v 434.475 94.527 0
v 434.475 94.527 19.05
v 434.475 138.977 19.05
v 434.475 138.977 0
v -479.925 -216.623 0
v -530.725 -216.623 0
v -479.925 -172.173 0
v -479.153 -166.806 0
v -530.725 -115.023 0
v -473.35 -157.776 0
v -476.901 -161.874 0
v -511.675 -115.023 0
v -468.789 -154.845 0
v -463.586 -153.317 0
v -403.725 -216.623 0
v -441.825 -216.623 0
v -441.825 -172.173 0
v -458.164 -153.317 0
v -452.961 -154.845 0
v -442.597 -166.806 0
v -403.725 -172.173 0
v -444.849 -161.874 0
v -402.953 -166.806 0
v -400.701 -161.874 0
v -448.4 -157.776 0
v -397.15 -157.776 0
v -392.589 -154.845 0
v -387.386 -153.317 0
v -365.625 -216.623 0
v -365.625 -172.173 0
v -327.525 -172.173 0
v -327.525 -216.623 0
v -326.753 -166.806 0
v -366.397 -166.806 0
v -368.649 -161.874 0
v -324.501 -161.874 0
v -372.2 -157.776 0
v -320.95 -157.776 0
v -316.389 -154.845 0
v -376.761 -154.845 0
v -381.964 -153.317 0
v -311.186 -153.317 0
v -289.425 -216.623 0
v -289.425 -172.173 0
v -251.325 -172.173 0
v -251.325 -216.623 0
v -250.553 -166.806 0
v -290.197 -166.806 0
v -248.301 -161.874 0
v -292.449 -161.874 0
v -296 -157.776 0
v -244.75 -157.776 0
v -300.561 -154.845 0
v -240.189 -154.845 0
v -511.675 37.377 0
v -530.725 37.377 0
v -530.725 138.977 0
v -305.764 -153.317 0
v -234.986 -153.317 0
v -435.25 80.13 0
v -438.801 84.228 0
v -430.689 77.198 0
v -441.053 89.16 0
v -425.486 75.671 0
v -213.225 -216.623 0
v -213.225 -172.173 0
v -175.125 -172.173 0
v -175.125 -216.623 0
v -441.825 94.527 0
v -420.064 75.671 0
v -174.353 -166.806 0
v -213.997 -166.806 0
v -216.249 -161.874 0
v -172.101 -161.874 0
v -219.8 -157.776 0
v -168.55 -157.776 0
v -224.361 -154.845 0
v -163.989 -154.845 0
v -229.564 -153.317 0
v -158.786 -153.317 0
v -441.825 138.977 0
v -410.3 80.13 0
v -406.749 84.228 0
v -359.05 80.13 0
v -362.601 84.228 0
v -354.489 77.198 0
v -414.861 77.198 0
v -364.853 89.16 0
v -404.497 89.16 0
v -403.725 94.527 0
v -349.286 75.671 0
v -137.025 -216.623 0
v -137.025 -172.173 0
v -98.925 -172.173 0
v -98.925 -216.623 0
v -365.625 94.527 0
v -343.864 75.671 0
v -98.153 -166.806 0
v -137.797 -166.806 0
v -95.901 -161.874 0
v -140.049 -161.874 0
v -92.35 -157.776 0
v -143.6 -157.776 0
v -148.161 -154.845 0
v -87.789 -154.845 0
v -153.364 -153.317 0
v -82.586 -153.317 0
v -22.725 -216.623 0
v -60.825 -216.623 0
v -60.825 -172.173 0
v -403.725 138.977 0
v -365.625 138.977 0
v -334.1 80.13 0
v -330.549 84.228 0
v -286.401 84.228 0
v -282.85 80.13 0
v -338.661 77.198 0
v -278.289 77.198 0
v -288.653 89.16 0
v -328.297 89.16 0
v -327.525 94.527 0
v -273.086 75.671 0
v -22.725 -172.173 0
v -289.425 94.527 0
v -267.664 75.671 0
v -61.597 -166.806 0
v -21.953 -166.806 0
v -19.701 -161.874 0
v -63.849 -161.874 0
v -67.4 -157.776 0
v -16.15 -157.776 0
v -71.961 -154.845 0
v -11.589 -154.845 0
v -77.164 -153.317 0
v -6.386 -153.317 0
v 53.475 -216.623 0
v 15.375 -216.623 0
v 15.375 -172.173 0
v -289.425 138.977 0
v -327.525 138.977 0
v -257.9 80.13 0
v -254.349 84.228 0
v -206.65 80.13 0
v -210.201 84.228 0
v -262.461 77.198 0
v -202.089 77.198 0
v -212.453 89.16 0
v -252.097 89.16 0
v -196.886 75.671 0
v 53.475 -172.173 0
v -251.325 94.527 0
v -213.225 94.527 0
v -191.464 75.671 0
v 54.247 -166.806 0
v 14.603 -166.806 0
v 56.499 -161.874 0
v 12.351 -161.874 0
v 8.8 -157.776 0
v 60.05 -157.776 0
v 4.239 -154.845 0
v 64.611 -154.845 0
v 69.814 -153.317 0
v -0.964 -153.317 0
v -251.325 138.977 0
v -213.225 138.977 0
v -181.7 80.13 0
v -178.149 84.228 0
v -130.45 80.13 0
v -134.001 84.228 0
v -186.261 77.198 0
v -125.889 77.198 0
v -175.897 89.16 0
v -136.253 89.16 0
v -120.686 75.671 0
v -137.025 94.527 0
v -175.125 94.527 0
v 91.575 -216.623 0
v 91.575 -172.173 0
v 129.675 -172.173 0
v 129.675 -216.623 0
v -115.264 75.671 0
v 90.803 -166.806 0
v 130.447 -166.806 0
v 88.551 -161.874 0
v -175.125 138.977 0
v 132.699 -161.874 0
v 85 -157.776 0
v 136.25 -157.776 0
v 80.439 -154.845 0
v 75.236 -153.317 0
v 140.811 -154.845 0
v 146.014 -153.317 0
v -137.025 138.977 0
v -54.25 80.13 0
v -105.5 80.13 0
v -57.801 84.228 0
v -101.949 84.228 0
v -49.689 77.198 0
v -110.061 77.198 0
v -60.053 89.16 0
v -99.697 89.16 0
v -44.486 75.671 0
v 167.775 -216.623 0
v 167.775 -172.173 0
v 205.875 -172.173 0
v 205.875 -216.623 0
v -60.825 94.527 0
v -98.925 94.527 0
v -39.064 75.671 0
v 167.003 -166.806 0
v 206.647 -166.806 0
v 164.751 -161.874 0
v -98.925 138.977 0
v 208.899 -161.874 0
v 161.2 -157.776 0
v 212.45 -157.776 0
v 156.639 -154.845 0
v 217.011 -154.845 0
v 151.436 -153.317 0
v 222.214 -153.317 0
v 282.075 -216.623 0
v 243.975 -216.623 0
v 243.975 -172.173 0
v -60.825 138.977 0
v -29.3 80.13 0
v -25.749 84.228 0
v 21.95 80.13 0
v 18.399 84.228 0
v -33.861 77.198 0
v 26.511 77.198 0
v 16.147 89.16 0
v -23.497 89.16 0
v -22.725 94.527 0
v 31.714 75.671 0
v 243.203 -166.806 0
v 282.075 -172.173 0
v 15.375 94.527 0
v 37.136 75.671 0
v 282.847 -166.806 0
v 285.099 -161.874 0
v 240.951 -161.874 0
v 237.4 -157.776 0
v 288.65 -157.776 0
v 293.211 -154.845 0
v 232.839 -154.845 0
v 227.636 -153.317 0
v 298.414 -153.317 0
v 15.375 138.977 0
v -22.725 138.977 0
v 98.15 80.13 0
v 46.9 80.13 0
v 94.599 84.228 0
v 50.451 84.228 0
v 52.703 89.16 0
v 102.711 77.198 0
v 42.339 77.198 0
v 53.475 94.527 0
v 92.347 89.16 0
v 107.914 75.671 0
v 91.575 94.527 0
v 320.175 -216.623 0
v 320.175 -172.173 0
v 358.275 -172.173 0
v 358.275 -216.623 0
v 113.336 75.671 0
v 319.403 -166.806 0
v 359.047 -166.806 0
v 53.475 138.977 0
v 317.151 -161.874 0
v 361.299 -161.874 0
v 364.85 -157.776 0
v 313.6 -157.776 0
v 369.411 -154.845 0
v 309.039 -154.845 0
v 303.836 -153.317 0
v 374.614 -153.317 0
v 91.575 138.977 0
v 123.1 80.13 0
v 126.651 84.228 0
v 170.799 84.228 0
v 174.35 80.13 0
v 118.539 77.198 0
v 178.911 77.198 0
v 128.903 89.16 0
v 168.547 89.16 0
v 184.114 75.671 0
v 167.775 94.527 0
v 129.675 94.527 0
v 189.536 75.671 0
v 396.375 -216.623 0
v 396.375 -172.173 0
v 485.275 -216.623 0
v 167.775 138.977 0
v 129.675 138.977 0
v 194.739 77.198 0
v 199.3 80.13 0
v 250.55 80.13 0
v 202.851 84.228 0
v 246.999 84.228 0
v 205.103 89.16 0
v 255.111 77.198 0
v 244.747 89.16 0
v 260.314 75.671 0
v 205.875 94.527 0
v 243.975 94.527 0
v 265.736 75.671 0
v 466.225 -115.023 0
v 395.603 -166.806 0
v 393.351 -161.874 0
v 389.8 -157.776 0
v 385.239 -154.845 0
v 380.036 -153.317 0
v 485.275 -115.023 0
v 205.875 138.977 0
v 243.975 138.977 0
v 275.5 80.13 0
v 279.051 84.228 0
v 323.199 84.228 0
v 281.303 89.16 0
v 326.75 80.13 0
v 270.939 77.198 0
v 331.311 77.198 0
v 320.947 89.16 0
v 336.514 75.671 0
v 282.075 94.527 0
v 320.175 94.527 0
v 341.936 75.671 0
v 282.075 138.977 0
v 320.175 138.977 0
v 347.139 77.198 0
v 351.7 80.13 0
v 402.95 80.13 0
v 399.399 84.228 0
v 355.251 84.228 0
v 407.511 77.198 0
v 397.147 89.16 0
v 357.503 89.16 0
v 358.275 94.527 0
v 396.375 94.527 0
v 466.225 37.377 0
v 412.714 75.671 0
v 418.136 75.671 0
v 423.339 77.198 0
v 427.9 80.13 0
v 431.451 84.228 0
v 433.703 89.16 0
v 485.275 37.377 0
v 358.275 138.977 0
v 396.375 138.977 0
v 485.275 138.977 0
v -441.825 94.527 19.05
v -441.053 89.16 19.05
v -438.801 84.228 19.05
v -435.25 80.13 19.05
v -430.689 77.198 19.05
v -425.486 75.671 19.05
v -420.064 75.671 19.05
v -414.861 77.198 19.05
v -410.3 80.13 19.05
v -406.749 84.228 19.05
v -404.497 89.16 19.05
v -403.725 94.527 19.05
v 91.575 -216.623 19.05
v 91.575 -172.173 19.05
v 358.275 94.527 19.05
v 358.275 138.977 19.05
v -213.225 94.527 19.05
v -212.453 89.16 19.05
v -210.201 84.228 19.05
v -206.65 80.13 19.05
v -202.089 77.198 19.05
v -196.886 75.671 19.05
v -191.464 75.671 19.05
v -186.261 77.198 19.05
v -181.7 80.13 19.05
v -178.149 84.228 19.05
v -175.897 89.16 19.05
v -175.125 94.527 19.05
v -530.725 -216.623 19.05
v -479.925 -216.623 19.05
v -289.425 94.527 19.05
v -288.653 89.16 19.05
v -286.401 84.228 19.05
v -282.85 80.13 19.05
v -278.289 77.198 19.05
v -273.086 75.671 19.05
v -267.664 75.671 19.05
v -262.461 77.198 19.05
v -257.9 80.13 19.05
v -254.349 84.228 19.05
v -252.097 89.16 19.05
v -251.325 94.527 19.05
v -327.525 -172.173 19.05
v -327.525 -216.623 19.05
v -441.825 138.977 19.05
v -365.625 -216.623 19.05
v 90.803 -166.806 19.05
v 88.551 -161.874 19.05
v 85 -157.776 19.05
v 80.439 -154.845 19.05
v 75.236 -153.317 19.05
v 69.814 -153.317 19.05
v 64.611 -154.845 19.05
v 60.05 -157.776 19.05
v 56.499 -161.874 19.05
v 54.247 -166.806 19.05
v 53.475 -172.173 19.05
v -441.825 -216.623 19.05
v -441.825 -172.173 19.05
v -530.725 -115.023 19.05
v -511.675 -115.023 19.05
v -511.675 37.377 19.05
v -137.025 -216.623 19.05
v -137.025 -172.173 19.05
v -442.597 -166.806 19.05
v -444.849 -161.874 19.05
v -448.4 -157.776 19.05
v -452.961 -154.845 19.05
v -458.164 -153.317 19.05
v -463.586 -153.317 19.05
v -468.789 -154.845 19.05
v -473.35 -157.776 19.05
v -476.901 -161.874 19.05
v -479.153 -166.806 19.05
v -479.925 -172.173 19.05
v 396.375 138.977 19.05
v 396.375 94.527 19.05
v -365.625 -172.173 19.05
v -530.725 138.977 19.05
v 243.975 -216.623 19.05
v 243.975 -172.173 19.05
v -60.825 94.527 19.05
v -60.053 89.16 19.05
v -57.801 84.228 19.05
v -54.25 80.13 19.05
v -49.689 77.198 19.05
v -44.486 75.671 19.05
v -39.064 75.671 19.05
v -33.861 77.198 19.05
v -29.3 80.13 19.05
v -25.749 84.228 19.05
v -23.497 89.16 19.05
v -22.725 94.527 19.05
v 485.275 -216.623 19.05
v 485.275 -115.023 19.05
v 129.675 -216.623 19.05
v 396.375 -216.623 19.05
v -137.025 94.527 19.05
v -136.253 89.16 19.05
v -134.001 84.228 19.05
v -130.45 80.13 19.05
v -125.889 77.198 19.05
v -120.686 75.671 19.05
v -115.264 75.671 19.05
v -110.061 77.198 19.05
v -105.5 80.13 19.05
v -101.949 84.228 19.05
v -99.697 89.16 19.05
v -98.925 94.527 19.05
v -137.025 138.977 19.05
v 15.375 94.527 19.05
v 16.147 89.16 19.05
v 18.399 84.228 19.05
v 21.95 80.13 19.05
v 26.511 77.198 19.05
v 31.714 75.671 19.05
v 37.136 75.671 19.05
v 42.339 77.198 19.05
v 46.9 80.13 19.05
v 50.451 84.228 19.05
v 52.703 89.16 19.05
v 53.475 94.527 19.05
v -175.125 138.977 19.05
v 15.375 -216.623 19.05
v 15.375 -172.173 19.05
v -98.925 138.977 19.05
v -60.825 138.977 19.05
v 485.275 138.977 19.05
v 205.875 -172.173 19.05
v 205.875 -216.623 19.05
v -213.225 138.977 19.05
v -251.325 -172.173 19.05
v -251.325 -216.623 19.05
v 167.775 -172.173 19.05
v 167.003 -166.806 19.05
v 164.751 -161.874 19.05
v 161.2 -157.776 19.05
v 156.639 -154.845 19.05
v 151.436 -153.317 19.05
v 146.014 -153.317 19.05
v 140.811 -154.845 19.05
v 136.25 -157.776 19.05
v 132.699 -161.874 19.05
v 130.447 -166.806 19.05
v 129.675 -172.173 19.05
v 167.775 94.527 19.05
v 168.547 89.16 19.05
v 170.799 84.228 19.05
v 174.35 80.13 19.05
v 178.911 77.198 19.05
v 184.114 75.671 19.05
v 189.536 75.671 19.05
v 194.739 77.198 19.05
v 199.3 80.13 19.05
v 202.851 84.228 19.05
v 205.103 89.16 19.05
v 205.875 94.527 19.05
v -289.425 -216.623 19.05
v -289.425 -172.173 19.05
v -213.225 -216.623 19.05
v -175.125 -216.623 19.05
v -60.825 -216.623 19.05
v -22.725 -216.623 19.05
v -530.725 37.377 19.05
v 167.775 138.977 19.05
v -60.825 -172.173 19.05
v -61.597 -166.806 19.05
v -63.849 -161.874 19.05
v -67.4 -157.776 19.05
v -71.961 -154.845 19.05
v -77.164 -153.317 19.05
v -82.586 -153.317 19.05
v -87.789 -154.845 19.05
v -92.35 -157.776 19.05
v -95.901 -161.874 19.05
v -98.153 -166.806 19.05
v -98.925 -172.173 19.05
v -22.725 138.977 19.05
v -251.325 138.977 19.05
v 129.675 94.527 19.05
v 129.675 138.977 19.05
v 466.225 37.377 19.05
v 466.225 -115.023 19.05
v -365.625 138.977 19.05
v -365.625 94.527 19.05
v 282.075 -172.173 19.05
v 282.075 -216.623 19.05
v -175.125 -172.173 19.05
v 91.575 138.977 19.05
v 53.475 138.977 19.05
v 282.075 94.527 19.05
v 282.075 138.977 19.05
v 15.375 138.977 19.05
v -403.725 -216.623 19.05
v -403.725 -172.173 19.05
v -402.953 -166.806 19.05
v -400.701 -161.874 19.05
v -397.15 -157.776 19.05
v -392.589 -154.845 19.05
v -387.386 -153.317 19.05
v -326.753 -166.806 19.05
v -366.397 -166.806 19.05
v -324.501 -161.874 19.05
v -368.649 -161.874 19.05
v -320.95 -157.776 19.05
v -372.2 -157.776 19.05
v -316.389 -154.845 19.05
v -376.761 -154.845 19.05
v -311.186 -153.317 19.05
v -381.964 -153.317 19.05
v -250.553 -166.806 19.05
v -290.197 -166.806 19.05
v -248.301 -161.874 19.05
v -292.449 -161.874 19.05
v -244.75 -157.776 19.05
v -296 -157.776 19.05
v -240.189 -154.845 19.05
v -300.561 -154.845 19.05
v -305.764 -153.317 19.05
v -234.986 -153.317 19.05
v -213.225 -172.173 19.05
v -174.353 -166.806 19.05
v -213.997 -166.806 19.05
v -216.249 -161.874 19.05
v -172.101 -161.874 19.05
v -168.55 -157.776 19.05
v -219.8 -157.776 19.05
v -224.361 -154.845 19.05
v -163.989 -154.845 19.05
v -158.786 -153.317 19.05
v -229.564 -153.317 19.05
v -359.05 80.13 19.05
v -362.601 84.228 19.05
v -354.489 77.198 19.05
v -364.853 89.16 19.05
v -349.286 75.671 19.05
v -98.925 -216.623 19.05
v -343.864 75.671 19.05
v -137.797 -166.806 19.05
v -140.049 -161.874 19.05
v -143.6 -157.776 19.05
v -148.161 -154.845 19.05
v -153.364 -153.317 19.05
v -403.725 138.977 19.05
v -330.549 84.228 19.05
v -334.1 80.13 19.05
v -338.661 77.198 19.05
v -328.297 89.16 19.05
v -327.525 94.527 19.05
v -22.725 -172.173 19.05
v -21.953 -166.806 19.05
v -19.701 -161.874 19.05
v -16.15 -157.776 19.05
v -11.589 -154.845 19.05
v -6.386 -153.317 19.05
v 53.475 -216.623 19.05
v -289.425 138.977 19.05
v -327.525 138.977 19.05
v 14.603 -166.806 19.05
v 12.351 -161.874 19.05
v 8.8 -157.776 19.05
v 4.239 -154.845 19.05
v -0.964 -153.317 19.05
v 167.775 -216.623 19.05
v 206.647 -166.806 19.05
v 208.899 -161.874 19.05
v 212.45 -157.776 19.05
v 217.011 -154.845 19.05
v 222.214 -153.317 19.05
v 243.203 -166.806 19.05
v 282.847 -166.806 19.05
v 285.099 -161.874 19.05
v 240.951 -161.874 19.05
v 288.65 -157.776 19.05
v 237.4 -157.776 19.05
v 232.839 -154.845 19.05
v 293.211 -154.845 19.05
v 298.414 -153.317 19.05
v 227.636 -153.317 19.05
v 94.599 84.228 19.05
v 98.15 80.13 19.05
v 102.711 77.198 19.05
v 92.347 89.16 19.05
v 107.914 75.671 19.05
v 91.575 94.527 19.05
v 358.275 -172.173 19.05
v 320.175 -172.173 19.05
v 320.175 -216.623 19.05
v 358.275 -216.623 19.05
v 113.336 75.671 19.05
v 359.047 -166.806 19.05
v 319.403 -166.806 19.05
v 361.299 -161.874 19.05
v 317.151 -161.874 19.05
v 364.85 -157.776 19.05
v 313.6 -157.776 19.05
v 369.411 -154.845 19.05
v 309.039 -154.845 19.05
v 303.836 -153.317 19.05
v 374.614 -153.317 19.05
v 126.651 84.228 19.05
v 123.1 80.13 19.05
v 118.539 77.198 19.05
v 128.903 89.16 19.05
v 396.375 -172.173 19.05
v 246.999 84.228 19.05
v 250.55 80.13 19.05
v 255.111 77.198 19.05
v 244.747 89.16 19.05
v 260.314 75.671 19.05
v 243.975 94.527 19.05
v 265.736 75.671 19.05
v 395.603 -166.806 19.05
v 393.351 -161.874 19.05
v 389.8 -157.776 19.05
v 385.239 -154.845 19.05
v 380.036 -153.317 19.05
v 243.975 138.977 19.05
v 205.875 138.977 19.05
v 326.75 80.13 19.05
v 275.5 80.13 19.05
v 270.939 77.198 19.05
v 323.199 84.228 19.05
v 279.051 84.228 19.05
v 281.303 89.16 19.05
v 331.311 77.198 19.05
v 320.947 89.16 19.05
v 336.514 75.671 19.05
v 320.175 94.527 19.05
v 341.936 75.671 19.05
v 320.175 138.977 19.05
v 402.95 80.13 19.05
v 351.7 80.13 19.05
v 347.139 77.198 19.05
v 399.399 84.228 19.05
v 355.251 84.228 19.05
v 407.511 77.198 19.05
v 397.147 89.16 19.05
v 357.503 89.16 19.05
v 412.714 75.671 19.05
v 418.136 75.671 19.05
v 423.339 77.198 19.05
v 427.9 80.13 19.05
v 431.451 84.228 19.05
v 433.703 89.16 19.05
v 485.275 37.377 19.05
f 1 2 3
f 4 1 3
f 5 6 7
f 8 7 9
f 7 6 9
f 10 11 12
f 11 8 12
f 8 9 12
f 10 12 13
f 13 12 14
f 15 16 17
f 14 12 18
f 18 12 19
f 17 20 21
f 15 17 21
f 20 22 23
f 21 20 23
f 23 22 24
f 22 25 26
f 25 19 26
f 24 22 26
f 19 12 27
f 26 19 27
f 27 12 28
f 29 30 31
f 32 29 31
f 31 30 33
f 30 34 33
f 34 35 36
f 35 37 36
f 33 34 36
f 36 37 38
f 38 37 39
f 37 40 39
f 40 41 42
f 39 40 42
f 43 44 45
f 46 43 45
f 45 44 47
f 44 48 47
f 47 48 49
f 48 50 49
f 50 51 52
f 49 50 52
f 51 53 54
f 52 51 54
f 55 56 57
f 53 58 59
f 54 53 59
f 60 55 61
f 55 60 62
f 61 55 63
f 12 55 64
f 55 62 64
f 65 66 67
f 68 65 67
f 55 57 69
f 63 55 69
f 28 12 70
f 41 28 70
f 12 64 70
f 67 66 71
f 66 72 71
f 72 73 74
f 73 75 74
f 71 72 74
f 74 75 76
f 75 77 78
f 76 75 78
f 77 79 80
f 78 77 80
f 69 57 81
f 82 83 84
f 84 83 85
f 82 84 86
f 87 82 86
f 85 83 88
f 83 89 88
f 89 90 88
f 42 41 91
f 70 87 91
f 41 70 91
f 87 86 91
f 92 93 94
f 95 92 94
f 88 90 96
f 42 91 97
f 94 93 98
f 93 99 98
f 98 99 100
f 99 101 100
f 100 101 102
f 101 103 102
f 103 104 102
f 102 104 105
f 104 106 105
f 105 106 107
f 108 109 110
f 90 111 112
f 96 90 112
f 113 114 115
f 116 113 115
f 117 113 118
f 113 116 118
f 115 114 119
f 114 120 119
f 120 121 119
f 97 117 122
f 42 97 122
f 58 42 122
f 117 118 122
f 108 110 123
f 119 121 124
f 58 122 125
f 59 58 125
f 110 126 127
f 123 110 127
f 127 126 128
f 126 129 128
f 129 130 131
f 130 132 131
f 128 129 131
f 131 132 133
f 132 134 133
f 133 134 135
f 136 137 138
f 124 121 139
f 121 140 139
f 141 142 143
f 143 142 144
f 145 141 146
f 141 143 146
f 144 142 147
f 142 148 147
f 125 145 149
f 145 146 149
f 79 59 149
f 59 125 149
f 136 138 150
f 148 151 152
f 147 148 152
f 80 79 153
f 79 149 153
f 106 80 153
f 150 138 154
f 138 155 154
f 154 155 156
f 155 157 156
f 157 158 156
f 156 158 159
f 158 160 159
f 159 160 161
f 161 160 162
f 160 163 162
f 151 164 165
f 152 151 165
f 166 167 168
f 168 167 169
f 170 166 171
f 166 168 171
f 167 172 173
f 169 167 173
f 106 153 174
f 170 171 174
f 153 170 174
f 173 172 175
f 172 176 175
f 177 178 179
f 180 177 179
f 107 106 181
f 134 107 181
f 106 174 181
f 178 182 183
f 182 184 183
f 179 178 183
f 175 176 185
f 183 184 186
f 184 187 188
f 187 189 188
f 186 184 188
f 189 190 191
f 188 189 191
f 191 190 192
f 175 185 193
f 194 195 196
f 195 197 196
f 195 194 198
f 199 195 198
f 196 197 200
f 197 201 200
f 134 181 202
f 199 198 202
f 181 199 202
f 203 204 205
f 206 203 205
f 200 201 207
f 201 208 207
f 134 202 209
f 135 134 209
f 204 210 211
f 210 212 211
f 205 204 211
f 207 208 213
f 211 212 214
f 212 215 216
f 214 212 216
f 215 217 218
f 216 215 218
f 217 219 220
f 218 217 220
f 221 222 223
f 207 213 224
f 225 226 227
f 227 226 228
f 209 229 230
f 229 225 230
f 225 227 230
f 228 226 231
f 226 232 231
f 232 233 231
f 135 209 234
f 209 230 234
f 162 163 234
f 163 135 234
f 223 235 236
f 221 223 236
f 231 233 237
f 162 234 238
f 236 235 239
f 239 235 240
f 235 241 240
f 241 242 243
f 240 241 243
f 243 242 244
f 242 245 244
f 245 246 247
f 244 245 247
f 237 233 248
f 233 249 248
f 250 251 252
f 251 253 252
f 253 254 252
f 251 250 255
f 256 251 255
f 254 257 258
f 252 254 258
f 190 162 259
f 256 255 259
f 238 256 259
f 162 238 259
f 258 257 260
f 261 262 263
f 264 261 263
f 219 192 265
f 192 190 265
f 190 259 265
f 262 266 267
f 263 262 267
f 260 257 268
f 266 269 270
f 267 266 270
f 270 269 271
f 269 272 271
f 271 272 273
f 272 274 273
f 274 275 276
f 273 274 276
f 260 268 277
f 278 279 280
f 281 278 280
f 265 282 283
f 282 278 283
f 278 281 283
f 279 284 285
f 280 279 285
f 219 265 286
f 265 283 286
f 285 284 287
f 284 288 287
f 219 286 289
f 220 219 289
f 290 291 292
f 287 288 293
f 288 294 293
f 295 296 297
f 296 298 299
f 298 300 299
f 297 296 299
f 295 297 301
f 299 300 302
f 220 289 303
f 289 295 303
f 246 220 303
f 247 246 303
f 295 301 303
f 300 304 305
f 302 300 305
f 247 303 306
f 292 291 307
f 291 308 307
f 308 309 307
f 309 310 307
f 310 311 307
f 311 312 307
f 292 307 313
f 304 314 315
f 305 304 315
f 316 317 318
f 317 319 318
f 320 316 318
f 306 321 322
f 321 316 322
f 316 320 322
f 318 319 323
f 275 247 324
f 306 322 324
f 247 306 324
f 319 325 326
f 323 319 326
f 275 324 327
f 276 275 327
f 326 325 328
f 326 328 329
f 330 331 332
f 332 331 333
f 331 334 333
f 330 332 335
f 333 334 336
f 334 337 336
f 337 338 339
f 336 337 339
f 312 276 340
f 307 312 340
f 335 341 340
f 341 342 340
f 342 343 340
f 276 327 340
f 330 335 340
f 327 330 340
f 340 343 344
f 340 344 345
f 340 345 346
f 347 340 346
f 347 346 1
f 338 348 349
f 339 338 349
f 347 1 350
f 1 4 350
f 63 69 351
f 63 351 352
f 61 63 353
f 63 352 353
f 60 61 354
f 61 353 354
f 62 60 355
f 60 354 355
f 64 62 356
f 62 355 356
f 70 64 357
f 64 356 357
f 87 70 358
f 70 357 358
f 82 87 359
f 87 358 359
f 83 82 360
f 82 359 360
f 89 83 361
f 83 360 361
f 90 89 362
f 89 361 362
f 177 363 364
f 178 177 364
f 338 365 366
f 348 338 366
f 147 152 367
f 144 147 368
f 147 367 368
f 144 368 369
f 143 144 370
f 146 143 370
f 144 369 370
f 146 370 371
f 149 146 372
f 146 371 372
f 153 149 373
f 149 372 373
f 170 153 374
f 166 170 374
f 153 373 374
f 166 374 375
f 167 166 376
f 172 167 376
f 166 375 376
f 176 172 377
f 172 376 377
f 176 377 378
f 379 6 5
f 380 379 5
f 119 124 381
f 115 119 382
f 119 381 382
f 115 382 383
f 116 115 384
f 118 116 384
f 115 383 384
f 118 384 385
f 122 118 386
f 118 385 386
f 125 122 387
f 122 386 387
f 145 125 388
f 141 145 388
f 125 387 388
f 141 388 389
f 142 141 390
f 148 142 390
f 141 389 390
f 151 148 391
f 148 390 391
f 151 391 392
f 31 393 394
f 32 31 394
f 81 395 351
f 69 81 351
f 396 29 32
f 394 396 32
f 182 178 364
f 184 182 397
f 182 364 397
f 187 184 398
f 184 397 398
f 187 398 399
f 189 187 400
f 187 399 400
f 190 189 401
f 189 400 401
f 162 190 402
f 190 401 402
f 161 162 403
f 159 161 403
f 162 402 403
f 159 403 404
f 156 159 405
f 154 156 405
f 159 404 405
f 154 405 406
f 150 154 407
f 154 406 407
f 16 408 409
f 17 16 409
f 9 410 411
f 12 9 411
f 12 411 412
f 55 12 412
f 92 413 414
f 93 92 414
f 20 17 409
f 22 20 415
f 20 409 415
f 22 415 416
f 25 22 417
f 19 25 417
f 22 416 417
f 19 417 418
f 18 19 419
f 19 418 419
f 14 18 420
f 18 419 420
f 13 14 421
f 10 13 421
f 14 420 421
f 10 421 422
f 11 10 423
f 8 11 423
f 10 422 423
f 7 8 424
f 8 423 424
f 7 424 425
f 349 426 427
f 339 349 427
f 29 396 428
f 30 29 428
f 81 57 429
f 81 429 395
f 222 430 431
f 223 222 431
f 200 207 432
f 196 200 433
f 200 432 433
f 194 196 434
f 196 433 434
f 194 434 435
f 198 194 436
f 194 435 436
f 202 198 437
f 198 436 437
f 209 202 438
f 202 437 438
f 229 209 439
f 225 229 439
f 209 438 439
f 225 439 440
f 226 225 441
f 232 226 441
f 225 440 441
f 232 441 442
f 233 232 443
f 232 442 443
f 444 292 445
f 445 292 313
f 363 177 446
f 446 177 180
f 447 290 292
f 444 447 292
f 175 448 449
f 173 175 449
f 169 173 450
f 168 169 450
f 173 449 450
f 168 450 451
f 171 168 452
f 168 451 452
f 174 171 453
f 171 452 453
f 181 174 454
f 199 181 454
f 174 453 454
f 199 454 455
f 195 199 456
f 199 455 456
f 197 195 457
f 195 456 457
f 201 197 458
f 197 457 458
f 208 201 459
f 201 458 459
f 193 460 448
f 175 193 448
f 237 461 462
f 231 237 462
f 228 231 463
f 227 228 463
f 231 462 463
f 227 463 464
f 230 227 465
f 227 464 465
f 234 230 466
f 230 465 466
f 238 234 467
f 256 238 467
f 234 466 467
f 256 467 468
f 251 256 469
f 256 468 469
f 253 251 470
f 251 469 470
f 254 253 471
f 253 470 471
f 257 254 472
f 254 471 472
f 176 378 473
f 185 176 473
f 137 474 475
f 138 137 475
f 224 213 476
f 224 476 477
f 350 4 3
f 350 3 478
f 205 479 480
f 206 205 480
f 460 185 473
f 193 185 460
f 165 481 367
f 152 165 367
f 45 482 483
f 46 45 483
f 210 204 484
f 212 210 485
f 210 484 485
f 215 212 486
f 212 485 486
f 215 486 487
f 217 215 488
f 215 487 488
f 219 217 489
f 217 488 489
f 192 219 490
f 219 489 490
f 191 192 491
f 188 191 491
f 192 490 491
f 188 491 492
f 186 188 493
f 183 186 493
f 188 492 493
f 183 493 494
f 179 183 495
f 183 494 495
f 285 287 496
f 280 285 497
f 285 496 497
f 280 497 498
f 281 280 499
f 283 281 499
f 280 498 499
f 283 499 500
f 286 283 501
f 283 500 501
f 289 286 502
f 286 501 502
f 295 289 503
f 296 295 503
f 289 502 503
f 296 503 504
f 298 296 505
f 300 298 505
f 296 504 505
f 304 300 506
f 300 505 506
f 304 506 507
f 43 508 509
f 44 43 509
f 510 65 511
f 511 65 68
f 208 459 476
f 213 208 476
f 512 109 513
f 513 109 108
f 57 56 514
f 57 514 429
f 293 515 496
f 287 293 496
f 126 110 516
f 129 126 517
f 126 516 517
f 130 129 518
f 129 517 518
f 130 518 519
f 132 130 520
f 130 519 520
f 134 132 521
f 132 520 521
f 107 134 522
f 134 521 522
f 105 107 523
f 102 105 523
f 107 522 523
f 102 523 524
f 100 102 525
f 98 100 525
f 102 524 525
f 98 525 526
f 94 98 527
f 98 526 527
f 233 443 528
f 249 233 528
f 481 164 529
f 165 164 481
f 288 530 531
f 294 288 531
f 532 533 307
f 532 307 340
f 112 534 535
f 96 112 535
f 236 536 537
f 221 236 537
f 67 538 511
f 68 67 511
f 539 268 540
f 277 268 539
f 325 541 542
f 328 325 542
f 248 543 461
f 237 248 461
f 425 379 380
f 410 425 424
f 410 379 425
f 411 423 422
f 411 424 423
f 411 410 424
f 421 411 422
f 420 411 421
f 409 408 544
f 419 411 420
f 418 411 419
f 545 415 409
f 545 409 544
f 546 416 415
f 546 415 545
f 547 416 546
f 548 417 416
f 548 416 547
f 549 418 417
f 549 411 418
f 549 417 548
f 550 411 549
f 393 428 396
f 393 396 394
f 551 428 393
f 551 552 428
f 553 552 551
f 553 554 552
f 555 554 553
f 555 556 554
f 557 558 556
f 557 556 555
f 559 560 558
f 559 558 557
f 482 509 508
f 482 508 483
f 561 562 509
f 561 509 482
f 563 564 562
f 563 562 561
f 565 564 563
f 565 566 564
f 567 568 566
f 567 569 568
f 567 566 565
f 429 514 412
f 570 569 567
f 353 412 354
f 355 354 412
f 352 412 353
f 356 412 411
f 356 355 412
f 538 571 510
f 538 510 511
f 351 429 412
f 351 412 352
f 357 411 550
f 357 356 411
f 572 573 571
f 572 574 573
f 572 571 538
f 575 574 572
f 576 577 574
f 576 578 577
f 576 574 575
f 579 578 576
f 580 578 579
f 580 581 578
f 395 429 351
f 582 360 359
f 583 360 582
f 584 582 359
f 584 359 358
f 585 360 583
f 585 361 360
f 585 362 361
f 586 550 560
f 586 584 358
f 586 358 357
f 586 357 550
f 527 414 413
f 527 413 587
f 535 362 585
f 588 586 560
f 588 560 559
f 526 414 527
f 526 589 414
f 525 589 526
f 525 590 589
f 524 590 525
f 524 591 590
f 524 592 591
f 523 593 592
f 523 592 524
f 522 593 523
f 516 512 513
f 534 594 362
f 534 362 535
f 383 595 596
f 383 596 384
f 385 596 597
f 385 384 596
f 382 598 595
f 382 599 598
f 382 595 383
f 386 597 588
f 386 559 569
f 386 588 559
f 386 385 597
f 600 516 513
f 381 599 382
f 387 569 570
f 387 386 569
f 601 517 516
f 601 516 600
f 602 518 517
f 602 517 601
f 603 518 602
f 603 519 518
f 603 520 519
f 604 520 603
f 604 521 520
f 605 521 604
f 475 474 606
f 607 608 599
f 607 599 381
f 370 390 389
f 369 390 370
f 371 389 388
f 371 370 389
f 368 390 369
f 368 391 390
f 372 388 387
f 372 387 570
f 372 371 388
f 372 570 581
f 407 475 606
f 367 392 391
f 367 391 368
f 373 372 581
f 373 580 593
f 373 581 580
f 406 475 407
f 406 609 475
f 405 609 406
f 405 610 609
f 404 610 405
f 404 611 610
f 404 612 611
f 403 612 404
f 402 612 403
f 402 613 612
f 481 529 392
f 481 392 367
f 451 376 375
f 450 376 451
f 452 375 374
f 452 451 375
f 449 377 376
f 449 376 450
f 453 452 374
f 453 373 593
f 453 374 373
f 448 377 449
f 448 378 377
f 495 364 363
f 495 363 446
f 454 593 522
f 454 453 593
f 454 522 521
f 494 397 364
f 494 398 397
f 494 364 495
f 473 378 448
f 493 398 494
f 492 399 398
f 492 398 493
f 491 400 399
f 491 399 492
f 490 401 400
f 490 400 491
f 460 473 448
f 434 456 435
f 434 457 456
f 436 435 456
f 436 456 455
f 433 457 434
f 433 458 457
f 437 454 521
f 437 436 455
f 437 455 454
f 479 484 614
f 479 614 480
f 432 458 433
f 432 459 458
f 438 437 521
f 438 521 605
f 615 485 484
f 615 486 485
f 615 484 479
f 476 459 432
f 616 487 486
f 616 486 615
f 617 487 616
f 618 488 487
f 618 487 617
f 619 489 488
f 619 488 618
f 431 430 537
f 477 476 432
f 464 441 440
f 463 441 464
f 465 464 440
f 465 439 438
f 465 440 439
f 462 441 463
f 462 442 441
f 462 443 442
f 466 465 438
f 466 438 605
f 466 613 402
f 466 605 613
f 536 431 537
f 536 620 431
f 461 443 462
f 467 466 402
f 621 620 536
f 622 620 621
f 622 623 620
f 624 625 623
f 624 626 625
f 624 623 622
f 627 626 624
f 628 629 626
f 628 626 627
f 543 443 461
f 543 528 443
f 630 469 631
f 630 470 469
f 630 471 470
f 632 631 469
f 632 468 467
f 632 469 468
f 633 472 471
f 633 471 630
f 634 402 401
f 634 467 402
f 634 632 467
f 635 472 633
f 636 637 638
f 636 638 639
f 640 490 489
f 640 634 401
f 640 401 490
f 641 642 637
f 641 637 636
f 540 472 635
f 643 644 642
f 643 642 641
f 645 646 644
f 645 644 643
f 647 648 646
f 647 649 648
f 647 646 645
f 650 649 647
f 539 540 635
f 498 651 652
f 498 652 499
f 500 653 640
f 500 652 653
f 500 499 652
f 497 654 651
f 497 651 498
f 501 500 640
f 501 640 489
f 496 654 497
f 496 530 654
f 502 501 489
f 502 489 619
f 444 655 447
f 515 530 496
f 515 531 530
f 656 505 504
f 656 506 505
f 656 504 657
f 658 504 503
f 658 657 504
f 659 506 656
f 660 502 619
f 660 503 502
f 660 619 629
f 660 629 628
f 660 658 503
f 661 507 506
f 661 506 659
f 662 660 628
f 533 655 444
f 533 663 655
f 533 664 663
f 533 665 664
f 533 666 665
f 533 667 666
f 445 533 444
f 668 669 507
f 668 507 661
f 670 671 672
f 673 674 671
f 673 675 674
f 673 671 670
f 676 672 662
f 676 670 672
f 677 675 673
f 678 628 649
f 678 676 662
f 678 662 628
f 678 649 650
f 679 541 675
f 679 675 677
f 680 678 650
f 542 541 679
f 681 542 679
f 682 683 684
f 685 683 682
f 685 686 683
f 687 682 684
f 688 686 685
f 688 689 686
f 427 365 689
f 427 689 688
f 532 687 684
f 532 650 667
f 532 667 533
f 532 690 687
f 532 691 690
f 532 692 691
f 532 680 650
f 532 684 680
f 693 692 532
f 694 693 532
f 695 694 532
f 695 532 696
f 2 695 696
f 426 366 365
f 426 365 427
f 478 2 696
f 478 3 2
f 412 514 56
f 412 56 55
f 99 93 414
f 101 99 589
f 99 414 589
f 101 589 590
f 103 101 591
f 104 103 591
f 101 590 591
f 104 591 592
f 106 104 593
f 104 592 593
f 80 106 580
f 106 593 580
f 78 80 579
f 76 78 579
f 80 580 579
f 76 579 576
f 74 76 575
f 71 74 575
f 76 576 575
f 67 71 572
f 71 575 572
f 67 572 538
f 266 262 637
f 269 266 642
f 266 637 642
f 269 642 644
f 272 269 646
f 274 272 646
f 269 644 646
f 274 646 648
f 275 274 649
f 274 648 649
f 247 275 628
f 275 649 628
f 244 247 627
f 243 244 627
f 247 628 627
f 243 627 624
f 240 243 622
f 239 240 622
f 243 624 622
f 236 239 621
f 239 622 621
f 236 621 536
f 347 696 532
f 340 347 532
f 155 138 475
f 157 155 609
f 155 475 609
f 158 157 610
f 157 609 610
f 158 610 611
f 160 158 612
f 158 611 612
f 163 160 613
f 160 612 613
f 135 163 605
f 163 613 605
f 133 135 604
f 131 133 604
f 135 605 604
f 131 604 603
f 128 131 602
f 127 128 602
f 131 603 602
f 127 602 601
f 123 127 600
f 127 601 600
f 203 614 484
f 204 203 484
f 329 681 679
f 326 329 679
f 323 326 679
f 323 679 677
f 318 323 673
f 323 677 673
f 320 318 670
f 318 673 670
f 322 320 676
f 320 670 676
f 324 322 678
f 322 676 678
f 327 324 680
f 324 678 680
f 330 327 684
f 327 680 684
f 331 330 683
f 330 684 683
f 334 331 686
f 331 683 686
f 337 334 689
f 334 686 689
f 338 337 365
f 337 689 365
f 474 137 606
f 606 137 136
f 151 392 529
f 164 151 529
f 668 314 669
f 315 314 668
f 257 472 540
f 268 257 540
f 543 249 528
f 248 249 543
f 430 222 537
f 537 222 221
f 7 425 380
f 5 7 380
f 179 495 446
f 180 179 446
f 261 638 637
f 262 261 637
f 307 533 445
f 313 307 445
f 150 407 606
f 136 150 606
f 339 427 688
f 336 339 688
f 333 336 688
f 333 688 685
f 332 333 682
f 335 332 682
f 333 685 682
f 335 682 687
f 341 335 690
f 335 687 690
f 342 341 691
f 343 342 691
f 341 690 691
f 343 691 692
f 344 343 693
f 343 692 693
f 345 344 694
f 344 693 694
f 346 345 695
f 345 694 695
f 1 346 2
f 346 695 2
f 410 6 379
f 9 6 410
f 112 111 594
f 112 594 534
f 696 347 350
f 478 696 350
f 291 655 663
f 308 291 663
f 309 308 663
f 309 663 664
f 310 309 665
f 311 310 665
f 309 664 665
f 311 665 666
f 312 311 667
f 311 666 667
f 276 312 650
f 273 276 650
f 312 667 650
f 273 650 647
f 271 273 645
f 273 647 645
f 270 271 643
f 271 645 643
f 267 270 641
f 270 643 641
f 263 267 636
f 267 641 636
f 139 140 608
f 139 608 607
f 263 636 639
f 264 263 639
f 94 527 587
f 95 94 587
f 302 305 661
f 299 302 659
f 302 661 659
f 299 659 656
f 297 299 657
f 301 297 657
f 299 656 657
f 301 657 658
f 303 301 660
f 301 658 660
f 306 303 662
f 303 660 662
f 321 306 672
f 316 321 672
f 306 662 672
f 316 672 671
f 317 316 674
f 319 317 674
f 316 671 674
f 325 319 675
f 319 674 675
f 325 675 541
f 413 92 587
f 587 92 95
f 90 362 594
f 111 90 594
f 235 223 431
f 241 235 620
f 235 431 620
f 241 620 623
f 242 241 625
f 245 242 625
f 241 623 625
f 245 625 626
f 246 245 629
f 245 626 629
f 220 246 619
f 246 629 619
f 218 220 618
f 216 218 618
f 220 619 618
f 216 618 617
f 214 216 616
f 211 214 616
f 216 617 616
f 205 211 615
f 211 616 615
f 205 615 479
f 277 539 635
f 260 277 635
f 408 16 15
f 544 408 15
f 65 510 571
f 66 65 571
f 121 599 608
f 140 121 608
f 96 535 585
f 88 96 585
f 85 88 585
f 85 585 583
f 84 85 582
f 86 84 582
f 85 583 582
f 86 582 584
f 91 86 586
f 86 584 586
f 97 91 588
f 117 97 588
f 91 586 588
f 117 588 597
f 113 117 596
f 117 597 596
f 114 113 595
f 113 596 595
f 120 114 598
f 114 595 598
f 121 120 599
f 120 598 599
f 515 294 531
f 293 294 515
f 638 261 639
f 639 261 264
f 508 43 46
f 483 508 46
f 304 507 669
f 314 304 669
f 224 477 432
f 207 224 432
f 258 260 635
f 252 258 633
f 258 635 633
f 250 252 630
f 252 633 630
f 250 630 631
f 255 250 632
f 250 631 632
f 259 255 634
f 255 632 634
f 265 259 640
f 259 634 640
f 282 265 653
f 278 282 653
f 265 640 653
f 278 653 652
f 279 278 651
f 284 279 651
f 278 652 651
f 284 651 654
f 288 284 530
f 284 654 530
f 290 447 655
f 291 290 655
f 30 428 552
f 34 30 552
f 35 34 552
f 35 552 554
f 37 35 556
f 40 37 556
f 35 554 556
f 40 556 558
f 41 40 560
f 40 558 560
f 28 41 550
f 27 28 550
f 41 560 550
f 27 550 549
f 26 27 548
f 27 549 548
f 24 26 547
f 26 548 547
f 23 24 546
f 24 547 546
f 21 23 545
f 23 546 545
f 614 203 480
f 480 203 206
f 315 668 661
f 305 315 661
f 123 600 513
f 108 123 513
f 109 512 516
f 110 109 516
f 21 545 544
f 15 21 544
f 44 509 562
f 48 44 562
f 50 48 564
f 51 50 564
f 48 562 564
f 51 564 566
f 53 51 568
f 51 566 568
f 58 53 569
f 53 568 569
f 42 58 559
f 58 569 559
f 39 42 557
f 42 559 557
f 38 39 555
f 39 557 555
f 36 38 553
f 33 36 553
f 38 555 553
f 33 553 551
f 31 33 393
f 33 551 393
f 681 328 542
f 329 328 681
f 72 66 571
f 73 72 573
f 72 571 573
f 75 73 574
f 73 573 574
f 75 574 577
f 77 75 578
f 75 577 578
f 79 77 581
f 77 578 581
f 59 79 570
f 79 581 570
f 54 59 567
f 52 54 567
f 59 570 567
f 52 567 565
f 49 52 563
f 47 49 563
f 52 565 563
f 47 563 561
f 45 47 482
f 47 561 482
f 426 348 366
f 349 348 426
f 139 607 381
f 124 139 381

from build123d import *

# Parameters (mm, degrees)
F0_W     = 1016
F0_H     = 355.6
F1_DEPTH = 19.05
F3_DEPTH = 19.051
F5_DEPTH = 19.051
F6_W     = 6.35
F6_H     = 152.4
F7_DEPTH = 19.051


with BuildPart() as f1:
    # F0 (on Top) → F1 (new body)
    with BuildSketch(Plane.XY):
        with Locations((-22.724911, -38.823086)):
            Rectangle(F0_W, F0_H)
    extrude(amount=F1_DEPTH)

    # F2 (on face) → F3 (cut, through all)
    with BuildSketch(Plane.XY.offset(19.05)):
        with BuildLine():
            Line((-403.724911, 138.976914), (-441.824911, 138.976914))
            Line((-441.824911, 138.976914), (-441.824911, 94.526914))
            ThreePointArc((-441.824911, 94.526914), (-422.774911, 75.476914), (-403.724911, 94.526914))
            Line((-403.724911, 94.526914), (-403.724911, 138.976914))
        make_face()
        with BuildLine():
            Line((-441.824911, -216.623086), (-441.824911, -172.173086))
            ThreePointArc((-441.824911, -172.173086), (-460.874911, -153.123086), (-479.924911, -172.173086))
            Line((-479.924911, -172.173086), (-479.924911, -216.623086))
            Line((-479.924911, -216.623086), (-441.824911, -216.623086))
        make_face()
        with BuildLine():
            Line((-327.524911, 138.976914), (-365.624911, 138.976914))
            Line((-365.624911, 138.976914), (-365.624911, 94.526914))
            ThreePointArc((-365.624911, 94.526914), (-346.574911, 75.476914), (-327.524911, 94.526914))
            Line((-327.524911, 94.526914), (-327.524911, 138.976914))
        make_face()
        with BuildLine():
            Line((-365.624911, -216.623086), (-365.624911, -172.173086))
            ThreePointArc((-365.624911, -172.173086), (-384.674911, -153.123086), (-403.724911, -172.173086))
            Line((-403.724911, -172.173086), (-403.724911, -216.623086))
            Line((-403.724911, -216.623086), (-365.624911, -216.623086))
        make_face()
        with BuildLine():
            Line((-251.324911, 138.976914), (-289.424911, 138.976914))
            Line((-289.424911, 138.976914), (-289.424911, 94.526914))
            ThreePointArc((-289.424911, 94.526914), (-270.374911, 75.476914), (-251.324911, 94.526914))
            Line((-251.324911, 94.526914), (-251.324911, 138.976914))
        make_face()
        with BuildLine():
            Line((-289.424911, -216.623086), (-289.424911, -172.173086))
            ThreePointArc((-289.424911, -172.173086), (-308.474911, -153.123086), (-327.524911, -172.173086))
            Line((-327.524911, -172.173086), (-327.524911, -216.623086))
            Line((-327.524911, -216.623086), (-289.424911, -216.623086))
        make_face()
        with BuildLine():
            Line((-175.124911, 138.976914), (-213.224911, 138.976914))
            Line((-213.224911, 138.976914), (-213.224911, 94.526914))
            ThreePointArc((-213.224911, 94.526914), (-194.174911, 75.476914), (-175.124911, 94.526914))
            Line((-175.124911, 94.526914), (-175.124911, 138.976914))
        make_face()
        with BuildLine():
            Line((-213.224911, -216.623086), (-213.224911, -172.173086))
            ThreePointArc((-213.224911, -172.173086), (-232.274911, -153.123086), (-251.324911, -172.173086))
            Line((-251.324911, -172.173086), (-251.324911, -216.623086))
            Line((-251.324911, -216.623086), (-213.224911, -216.623086))
        make_face()
        with BuildLine():
            Line((-98.924911, 138.976914), (-137.024911, 138.976914))
            Line((-137.024911, 138.976914), (-137.024911, 94.526914))
            ThreePointArc((-137.024911, 94.526914), (-117.974911, 75.476914), (-98.924911, 94.526914))
            Line((-98.924911, 94.526914), (-98.924911, 138.976914))
        make_face()
        with BuildLine():
            Line((-137.024911, -216.623086), (-137.024911, -172.173086))
            ThreePointArc((-137.024911, -172.173086), (-156.074911, -153.123086), (-175.124911, -172.173086))
            Line((-175.124911, -172.173086), (-175.124911, -216.623086))
            Line((-175.124911, -216.623086), (-137.024911, -216.623086))
        make_face()
        with BuildLine():
            Line((-22.724911, 138.976914), (-60.824911, 138.976914))
            Line((-60.824911, 138.976914), (-60.824911, 94.526914))
            ThreePointArc((-60.824911, 94.526914), (-41.774911, 75.476914), (-22.724911, 94.526914))
            Line((-22.724911, 94.526914), (-22.724911, 138.976914))
        make_face()
        with BuildLine():
            Line((-60.824911, -216.623086), (-60.824911, -172.173086))
            ThreePointArc((-60.824911, -172.173086), (-79.874911, -153.123086), (-98.924911, -172.173086))
            Line((-98.924911, -172.173086), (-98.924911, -216.623086))
            Line((-98.924911, -216.623086), (-60.824911, -216.623086))
        make_face()
        with BuildLine():
            Line((53.475089, 138.976914), (15.375089, 138.976914))
            Line((15.375089, 138.976914), (15.375089, 94.526914))
            ThreePointArc((15.375089, 94.526914), (34.425089, 75.476914), (53.475089, 94.526914))
            Line((53.475089, 94.526914), (53.475089, 138.976914))
        make_face()
        with BuildLine():
            Line((15.375089, -216.623086), (15.375089, -172.173086))
            ThreePointArc((15.375089, -172.173086), (-3.674911, -153.123086), (-22.724911, -172.173086))
            Line((-22.724911, -172.173086), (-22.724911, -216.623086))
            Line((-22.724911, -216.623086), (15.375089, -216.623086))
        make_face()
        with BuildLine():
            Line((129.675089, 138.976914), (91.575089, 138.976914))
            Line((91.575089, 138.976914), (91.575089, 94.526914))
            ThreePointArc((91.575089, 94.526914), (110.625089, 75.476914), (129.675089, 94.526914))
            Line((129.675089, 94.526914), (129.675089, 138.976914))
        make_face()
        with BuildLine():
            Line((91.575089, -216.623086), (91.575089, -172.173086))
            ThreePointArc((91.575089, -172.173086), (72.525089, -153.123086), (53.475089, -172.173086))
            Line((53.475089, -172.173086), (53.475089, -216.623086))
            Line((53.475089, -216.623086), (91.575089, -216.623086))
        make_face()
        with BuildLine():
            Line((205.875089, 138.976914), (167.775089, 138.976914))
            Line((167.775089, 138.976914), (167.775089, 94.526914))
            ThreePointArc((167.775089, 94.526914), (186.825089, 75.476914), (205.875089, 94.526914))
            Line((205.875089, 94.526914), (205.875089, 138.976914))
        make_face()
        with BuildLine():
            Line((167.775089, -216.623086), (167.775089, -172.173086))
            ThreePointArc((167.775089, -172.173086), (148.725089, -153.123086), (129.675089, -172.173086))
            Line((129.675089, -172.173086), (129.675089, -216.623086))
            Line((129.675089, -216.623086), (167.775089, -216.623086))
        make_face()
        with BuildLine():
            Line((282.075089, 94.526914), (282.075089, 138.976914))
            Line((282.075089, 138.976914), (243.975089, 138.976914))
            Line((243.975089, 138.976914), (243.975089, 94.526914))
            ThreePointArc((243.975089, 94.526914), (263.025089, 75.476914), (282.075089, 94.526914))
        make_face()
        with BuildLine():
            Line((243.975089, -216.623086), (243.975089, -172.173086))
            ThreePointArc((243.975089, -172.173086), (224.925089, -153.123086), (205.875089, -172.173086))
            Line((205.875089, -172.173086), (205.875089, -216.623086))
            Line((205.875089, -216.623086), (243.975089, -216.623086))
        make_face()
        with BuildLine():
            Line((358.275089, 94.526914), (358.275089, 138.976914))
            Line((358.275089, 138.976914), (320.175089, 138.976914))
            Line((320.175089, 138.976914), (320.175089, 94.526914))
            ThreePointArc((320.175089, 94.526914), (339.225089, 75.476914), (358.275089, 94.526914))
        make_face()
        with BuildLine():
            Line((320.175089, -216.623086), (320.175089, -172.173086))
            ThreePointArc((320.175089, -172.173086), (301.125089, -153.123086), (282.075089, -172.173086))
            Line((282.075089, -172.173086), (282.075089, -216.623086))
            Line((282.075089, -216.623086), (320.175089, -216.623086))
        make_face()
        with BuildLine():
            Line((434.475089, 94.526914), (434.475089, 138.976914))
            Line((434.475089, 138.976914), (396.375089, 138.976914))
            Line((396.375089, 138.976914), (396.375089, 94.526914))
            ThreePointArc((396.375089, 94.526914), (415.425089, 75.476914), (434.475089, 94.526914))
        make_face()
        with BuildLine():
            Line((396.375089, -216.623086), (396.375089, -172.173086))
            ThreePointArc((396.375089, -172.173086), (377.325089, -153.123086), (358.275089, -172.173086))
            Line((358.275089, -172.173086), (358.275089, -216.623086))
            Line((358.275089, -216.623086), (396.375089, -216.623086))
        make_face()
    extrude(amount=-F3_DEPTH, mode=Mode.SUBTRACT)

    # F4 (on face) → F5 (cut, through all)
    with BuildSketch(Plane.XY.offset(19.05)):
        Polygon((-518.024911, -115.023086), (-518.024911, -38.823086), (-518.024911, 37.376914), (-530.724911, 37.376914), (-530.724911, -38.823086), (-530.724911, -115.023086), align=None)
        Polygon((485.275089, 37.376914), (472.575089, 37.376914), (472.575089, -38.823086), (472.575089, -115.023086), (485.275089, -115.023086), (485.275089, -38.823086), align=None)
    extrude(amount=-F5_DEPTH, mode=Mode.SUBTRACT)

    # F6 (on face) → F7 (cut, through all)
    with BuildSketch(Plane.XY.offset(19.05)):
        with Locations((-514.849911, -38.823086)):
            Rectangle(F6_W, F6_H)
        with Locations((469.400089, -38.823086)):
            Rectangle(F6_W, F6_H)
    extrude(amount=-F7_DEPTH, mode=Mode.SUBTRACT)


solid = f1.part
